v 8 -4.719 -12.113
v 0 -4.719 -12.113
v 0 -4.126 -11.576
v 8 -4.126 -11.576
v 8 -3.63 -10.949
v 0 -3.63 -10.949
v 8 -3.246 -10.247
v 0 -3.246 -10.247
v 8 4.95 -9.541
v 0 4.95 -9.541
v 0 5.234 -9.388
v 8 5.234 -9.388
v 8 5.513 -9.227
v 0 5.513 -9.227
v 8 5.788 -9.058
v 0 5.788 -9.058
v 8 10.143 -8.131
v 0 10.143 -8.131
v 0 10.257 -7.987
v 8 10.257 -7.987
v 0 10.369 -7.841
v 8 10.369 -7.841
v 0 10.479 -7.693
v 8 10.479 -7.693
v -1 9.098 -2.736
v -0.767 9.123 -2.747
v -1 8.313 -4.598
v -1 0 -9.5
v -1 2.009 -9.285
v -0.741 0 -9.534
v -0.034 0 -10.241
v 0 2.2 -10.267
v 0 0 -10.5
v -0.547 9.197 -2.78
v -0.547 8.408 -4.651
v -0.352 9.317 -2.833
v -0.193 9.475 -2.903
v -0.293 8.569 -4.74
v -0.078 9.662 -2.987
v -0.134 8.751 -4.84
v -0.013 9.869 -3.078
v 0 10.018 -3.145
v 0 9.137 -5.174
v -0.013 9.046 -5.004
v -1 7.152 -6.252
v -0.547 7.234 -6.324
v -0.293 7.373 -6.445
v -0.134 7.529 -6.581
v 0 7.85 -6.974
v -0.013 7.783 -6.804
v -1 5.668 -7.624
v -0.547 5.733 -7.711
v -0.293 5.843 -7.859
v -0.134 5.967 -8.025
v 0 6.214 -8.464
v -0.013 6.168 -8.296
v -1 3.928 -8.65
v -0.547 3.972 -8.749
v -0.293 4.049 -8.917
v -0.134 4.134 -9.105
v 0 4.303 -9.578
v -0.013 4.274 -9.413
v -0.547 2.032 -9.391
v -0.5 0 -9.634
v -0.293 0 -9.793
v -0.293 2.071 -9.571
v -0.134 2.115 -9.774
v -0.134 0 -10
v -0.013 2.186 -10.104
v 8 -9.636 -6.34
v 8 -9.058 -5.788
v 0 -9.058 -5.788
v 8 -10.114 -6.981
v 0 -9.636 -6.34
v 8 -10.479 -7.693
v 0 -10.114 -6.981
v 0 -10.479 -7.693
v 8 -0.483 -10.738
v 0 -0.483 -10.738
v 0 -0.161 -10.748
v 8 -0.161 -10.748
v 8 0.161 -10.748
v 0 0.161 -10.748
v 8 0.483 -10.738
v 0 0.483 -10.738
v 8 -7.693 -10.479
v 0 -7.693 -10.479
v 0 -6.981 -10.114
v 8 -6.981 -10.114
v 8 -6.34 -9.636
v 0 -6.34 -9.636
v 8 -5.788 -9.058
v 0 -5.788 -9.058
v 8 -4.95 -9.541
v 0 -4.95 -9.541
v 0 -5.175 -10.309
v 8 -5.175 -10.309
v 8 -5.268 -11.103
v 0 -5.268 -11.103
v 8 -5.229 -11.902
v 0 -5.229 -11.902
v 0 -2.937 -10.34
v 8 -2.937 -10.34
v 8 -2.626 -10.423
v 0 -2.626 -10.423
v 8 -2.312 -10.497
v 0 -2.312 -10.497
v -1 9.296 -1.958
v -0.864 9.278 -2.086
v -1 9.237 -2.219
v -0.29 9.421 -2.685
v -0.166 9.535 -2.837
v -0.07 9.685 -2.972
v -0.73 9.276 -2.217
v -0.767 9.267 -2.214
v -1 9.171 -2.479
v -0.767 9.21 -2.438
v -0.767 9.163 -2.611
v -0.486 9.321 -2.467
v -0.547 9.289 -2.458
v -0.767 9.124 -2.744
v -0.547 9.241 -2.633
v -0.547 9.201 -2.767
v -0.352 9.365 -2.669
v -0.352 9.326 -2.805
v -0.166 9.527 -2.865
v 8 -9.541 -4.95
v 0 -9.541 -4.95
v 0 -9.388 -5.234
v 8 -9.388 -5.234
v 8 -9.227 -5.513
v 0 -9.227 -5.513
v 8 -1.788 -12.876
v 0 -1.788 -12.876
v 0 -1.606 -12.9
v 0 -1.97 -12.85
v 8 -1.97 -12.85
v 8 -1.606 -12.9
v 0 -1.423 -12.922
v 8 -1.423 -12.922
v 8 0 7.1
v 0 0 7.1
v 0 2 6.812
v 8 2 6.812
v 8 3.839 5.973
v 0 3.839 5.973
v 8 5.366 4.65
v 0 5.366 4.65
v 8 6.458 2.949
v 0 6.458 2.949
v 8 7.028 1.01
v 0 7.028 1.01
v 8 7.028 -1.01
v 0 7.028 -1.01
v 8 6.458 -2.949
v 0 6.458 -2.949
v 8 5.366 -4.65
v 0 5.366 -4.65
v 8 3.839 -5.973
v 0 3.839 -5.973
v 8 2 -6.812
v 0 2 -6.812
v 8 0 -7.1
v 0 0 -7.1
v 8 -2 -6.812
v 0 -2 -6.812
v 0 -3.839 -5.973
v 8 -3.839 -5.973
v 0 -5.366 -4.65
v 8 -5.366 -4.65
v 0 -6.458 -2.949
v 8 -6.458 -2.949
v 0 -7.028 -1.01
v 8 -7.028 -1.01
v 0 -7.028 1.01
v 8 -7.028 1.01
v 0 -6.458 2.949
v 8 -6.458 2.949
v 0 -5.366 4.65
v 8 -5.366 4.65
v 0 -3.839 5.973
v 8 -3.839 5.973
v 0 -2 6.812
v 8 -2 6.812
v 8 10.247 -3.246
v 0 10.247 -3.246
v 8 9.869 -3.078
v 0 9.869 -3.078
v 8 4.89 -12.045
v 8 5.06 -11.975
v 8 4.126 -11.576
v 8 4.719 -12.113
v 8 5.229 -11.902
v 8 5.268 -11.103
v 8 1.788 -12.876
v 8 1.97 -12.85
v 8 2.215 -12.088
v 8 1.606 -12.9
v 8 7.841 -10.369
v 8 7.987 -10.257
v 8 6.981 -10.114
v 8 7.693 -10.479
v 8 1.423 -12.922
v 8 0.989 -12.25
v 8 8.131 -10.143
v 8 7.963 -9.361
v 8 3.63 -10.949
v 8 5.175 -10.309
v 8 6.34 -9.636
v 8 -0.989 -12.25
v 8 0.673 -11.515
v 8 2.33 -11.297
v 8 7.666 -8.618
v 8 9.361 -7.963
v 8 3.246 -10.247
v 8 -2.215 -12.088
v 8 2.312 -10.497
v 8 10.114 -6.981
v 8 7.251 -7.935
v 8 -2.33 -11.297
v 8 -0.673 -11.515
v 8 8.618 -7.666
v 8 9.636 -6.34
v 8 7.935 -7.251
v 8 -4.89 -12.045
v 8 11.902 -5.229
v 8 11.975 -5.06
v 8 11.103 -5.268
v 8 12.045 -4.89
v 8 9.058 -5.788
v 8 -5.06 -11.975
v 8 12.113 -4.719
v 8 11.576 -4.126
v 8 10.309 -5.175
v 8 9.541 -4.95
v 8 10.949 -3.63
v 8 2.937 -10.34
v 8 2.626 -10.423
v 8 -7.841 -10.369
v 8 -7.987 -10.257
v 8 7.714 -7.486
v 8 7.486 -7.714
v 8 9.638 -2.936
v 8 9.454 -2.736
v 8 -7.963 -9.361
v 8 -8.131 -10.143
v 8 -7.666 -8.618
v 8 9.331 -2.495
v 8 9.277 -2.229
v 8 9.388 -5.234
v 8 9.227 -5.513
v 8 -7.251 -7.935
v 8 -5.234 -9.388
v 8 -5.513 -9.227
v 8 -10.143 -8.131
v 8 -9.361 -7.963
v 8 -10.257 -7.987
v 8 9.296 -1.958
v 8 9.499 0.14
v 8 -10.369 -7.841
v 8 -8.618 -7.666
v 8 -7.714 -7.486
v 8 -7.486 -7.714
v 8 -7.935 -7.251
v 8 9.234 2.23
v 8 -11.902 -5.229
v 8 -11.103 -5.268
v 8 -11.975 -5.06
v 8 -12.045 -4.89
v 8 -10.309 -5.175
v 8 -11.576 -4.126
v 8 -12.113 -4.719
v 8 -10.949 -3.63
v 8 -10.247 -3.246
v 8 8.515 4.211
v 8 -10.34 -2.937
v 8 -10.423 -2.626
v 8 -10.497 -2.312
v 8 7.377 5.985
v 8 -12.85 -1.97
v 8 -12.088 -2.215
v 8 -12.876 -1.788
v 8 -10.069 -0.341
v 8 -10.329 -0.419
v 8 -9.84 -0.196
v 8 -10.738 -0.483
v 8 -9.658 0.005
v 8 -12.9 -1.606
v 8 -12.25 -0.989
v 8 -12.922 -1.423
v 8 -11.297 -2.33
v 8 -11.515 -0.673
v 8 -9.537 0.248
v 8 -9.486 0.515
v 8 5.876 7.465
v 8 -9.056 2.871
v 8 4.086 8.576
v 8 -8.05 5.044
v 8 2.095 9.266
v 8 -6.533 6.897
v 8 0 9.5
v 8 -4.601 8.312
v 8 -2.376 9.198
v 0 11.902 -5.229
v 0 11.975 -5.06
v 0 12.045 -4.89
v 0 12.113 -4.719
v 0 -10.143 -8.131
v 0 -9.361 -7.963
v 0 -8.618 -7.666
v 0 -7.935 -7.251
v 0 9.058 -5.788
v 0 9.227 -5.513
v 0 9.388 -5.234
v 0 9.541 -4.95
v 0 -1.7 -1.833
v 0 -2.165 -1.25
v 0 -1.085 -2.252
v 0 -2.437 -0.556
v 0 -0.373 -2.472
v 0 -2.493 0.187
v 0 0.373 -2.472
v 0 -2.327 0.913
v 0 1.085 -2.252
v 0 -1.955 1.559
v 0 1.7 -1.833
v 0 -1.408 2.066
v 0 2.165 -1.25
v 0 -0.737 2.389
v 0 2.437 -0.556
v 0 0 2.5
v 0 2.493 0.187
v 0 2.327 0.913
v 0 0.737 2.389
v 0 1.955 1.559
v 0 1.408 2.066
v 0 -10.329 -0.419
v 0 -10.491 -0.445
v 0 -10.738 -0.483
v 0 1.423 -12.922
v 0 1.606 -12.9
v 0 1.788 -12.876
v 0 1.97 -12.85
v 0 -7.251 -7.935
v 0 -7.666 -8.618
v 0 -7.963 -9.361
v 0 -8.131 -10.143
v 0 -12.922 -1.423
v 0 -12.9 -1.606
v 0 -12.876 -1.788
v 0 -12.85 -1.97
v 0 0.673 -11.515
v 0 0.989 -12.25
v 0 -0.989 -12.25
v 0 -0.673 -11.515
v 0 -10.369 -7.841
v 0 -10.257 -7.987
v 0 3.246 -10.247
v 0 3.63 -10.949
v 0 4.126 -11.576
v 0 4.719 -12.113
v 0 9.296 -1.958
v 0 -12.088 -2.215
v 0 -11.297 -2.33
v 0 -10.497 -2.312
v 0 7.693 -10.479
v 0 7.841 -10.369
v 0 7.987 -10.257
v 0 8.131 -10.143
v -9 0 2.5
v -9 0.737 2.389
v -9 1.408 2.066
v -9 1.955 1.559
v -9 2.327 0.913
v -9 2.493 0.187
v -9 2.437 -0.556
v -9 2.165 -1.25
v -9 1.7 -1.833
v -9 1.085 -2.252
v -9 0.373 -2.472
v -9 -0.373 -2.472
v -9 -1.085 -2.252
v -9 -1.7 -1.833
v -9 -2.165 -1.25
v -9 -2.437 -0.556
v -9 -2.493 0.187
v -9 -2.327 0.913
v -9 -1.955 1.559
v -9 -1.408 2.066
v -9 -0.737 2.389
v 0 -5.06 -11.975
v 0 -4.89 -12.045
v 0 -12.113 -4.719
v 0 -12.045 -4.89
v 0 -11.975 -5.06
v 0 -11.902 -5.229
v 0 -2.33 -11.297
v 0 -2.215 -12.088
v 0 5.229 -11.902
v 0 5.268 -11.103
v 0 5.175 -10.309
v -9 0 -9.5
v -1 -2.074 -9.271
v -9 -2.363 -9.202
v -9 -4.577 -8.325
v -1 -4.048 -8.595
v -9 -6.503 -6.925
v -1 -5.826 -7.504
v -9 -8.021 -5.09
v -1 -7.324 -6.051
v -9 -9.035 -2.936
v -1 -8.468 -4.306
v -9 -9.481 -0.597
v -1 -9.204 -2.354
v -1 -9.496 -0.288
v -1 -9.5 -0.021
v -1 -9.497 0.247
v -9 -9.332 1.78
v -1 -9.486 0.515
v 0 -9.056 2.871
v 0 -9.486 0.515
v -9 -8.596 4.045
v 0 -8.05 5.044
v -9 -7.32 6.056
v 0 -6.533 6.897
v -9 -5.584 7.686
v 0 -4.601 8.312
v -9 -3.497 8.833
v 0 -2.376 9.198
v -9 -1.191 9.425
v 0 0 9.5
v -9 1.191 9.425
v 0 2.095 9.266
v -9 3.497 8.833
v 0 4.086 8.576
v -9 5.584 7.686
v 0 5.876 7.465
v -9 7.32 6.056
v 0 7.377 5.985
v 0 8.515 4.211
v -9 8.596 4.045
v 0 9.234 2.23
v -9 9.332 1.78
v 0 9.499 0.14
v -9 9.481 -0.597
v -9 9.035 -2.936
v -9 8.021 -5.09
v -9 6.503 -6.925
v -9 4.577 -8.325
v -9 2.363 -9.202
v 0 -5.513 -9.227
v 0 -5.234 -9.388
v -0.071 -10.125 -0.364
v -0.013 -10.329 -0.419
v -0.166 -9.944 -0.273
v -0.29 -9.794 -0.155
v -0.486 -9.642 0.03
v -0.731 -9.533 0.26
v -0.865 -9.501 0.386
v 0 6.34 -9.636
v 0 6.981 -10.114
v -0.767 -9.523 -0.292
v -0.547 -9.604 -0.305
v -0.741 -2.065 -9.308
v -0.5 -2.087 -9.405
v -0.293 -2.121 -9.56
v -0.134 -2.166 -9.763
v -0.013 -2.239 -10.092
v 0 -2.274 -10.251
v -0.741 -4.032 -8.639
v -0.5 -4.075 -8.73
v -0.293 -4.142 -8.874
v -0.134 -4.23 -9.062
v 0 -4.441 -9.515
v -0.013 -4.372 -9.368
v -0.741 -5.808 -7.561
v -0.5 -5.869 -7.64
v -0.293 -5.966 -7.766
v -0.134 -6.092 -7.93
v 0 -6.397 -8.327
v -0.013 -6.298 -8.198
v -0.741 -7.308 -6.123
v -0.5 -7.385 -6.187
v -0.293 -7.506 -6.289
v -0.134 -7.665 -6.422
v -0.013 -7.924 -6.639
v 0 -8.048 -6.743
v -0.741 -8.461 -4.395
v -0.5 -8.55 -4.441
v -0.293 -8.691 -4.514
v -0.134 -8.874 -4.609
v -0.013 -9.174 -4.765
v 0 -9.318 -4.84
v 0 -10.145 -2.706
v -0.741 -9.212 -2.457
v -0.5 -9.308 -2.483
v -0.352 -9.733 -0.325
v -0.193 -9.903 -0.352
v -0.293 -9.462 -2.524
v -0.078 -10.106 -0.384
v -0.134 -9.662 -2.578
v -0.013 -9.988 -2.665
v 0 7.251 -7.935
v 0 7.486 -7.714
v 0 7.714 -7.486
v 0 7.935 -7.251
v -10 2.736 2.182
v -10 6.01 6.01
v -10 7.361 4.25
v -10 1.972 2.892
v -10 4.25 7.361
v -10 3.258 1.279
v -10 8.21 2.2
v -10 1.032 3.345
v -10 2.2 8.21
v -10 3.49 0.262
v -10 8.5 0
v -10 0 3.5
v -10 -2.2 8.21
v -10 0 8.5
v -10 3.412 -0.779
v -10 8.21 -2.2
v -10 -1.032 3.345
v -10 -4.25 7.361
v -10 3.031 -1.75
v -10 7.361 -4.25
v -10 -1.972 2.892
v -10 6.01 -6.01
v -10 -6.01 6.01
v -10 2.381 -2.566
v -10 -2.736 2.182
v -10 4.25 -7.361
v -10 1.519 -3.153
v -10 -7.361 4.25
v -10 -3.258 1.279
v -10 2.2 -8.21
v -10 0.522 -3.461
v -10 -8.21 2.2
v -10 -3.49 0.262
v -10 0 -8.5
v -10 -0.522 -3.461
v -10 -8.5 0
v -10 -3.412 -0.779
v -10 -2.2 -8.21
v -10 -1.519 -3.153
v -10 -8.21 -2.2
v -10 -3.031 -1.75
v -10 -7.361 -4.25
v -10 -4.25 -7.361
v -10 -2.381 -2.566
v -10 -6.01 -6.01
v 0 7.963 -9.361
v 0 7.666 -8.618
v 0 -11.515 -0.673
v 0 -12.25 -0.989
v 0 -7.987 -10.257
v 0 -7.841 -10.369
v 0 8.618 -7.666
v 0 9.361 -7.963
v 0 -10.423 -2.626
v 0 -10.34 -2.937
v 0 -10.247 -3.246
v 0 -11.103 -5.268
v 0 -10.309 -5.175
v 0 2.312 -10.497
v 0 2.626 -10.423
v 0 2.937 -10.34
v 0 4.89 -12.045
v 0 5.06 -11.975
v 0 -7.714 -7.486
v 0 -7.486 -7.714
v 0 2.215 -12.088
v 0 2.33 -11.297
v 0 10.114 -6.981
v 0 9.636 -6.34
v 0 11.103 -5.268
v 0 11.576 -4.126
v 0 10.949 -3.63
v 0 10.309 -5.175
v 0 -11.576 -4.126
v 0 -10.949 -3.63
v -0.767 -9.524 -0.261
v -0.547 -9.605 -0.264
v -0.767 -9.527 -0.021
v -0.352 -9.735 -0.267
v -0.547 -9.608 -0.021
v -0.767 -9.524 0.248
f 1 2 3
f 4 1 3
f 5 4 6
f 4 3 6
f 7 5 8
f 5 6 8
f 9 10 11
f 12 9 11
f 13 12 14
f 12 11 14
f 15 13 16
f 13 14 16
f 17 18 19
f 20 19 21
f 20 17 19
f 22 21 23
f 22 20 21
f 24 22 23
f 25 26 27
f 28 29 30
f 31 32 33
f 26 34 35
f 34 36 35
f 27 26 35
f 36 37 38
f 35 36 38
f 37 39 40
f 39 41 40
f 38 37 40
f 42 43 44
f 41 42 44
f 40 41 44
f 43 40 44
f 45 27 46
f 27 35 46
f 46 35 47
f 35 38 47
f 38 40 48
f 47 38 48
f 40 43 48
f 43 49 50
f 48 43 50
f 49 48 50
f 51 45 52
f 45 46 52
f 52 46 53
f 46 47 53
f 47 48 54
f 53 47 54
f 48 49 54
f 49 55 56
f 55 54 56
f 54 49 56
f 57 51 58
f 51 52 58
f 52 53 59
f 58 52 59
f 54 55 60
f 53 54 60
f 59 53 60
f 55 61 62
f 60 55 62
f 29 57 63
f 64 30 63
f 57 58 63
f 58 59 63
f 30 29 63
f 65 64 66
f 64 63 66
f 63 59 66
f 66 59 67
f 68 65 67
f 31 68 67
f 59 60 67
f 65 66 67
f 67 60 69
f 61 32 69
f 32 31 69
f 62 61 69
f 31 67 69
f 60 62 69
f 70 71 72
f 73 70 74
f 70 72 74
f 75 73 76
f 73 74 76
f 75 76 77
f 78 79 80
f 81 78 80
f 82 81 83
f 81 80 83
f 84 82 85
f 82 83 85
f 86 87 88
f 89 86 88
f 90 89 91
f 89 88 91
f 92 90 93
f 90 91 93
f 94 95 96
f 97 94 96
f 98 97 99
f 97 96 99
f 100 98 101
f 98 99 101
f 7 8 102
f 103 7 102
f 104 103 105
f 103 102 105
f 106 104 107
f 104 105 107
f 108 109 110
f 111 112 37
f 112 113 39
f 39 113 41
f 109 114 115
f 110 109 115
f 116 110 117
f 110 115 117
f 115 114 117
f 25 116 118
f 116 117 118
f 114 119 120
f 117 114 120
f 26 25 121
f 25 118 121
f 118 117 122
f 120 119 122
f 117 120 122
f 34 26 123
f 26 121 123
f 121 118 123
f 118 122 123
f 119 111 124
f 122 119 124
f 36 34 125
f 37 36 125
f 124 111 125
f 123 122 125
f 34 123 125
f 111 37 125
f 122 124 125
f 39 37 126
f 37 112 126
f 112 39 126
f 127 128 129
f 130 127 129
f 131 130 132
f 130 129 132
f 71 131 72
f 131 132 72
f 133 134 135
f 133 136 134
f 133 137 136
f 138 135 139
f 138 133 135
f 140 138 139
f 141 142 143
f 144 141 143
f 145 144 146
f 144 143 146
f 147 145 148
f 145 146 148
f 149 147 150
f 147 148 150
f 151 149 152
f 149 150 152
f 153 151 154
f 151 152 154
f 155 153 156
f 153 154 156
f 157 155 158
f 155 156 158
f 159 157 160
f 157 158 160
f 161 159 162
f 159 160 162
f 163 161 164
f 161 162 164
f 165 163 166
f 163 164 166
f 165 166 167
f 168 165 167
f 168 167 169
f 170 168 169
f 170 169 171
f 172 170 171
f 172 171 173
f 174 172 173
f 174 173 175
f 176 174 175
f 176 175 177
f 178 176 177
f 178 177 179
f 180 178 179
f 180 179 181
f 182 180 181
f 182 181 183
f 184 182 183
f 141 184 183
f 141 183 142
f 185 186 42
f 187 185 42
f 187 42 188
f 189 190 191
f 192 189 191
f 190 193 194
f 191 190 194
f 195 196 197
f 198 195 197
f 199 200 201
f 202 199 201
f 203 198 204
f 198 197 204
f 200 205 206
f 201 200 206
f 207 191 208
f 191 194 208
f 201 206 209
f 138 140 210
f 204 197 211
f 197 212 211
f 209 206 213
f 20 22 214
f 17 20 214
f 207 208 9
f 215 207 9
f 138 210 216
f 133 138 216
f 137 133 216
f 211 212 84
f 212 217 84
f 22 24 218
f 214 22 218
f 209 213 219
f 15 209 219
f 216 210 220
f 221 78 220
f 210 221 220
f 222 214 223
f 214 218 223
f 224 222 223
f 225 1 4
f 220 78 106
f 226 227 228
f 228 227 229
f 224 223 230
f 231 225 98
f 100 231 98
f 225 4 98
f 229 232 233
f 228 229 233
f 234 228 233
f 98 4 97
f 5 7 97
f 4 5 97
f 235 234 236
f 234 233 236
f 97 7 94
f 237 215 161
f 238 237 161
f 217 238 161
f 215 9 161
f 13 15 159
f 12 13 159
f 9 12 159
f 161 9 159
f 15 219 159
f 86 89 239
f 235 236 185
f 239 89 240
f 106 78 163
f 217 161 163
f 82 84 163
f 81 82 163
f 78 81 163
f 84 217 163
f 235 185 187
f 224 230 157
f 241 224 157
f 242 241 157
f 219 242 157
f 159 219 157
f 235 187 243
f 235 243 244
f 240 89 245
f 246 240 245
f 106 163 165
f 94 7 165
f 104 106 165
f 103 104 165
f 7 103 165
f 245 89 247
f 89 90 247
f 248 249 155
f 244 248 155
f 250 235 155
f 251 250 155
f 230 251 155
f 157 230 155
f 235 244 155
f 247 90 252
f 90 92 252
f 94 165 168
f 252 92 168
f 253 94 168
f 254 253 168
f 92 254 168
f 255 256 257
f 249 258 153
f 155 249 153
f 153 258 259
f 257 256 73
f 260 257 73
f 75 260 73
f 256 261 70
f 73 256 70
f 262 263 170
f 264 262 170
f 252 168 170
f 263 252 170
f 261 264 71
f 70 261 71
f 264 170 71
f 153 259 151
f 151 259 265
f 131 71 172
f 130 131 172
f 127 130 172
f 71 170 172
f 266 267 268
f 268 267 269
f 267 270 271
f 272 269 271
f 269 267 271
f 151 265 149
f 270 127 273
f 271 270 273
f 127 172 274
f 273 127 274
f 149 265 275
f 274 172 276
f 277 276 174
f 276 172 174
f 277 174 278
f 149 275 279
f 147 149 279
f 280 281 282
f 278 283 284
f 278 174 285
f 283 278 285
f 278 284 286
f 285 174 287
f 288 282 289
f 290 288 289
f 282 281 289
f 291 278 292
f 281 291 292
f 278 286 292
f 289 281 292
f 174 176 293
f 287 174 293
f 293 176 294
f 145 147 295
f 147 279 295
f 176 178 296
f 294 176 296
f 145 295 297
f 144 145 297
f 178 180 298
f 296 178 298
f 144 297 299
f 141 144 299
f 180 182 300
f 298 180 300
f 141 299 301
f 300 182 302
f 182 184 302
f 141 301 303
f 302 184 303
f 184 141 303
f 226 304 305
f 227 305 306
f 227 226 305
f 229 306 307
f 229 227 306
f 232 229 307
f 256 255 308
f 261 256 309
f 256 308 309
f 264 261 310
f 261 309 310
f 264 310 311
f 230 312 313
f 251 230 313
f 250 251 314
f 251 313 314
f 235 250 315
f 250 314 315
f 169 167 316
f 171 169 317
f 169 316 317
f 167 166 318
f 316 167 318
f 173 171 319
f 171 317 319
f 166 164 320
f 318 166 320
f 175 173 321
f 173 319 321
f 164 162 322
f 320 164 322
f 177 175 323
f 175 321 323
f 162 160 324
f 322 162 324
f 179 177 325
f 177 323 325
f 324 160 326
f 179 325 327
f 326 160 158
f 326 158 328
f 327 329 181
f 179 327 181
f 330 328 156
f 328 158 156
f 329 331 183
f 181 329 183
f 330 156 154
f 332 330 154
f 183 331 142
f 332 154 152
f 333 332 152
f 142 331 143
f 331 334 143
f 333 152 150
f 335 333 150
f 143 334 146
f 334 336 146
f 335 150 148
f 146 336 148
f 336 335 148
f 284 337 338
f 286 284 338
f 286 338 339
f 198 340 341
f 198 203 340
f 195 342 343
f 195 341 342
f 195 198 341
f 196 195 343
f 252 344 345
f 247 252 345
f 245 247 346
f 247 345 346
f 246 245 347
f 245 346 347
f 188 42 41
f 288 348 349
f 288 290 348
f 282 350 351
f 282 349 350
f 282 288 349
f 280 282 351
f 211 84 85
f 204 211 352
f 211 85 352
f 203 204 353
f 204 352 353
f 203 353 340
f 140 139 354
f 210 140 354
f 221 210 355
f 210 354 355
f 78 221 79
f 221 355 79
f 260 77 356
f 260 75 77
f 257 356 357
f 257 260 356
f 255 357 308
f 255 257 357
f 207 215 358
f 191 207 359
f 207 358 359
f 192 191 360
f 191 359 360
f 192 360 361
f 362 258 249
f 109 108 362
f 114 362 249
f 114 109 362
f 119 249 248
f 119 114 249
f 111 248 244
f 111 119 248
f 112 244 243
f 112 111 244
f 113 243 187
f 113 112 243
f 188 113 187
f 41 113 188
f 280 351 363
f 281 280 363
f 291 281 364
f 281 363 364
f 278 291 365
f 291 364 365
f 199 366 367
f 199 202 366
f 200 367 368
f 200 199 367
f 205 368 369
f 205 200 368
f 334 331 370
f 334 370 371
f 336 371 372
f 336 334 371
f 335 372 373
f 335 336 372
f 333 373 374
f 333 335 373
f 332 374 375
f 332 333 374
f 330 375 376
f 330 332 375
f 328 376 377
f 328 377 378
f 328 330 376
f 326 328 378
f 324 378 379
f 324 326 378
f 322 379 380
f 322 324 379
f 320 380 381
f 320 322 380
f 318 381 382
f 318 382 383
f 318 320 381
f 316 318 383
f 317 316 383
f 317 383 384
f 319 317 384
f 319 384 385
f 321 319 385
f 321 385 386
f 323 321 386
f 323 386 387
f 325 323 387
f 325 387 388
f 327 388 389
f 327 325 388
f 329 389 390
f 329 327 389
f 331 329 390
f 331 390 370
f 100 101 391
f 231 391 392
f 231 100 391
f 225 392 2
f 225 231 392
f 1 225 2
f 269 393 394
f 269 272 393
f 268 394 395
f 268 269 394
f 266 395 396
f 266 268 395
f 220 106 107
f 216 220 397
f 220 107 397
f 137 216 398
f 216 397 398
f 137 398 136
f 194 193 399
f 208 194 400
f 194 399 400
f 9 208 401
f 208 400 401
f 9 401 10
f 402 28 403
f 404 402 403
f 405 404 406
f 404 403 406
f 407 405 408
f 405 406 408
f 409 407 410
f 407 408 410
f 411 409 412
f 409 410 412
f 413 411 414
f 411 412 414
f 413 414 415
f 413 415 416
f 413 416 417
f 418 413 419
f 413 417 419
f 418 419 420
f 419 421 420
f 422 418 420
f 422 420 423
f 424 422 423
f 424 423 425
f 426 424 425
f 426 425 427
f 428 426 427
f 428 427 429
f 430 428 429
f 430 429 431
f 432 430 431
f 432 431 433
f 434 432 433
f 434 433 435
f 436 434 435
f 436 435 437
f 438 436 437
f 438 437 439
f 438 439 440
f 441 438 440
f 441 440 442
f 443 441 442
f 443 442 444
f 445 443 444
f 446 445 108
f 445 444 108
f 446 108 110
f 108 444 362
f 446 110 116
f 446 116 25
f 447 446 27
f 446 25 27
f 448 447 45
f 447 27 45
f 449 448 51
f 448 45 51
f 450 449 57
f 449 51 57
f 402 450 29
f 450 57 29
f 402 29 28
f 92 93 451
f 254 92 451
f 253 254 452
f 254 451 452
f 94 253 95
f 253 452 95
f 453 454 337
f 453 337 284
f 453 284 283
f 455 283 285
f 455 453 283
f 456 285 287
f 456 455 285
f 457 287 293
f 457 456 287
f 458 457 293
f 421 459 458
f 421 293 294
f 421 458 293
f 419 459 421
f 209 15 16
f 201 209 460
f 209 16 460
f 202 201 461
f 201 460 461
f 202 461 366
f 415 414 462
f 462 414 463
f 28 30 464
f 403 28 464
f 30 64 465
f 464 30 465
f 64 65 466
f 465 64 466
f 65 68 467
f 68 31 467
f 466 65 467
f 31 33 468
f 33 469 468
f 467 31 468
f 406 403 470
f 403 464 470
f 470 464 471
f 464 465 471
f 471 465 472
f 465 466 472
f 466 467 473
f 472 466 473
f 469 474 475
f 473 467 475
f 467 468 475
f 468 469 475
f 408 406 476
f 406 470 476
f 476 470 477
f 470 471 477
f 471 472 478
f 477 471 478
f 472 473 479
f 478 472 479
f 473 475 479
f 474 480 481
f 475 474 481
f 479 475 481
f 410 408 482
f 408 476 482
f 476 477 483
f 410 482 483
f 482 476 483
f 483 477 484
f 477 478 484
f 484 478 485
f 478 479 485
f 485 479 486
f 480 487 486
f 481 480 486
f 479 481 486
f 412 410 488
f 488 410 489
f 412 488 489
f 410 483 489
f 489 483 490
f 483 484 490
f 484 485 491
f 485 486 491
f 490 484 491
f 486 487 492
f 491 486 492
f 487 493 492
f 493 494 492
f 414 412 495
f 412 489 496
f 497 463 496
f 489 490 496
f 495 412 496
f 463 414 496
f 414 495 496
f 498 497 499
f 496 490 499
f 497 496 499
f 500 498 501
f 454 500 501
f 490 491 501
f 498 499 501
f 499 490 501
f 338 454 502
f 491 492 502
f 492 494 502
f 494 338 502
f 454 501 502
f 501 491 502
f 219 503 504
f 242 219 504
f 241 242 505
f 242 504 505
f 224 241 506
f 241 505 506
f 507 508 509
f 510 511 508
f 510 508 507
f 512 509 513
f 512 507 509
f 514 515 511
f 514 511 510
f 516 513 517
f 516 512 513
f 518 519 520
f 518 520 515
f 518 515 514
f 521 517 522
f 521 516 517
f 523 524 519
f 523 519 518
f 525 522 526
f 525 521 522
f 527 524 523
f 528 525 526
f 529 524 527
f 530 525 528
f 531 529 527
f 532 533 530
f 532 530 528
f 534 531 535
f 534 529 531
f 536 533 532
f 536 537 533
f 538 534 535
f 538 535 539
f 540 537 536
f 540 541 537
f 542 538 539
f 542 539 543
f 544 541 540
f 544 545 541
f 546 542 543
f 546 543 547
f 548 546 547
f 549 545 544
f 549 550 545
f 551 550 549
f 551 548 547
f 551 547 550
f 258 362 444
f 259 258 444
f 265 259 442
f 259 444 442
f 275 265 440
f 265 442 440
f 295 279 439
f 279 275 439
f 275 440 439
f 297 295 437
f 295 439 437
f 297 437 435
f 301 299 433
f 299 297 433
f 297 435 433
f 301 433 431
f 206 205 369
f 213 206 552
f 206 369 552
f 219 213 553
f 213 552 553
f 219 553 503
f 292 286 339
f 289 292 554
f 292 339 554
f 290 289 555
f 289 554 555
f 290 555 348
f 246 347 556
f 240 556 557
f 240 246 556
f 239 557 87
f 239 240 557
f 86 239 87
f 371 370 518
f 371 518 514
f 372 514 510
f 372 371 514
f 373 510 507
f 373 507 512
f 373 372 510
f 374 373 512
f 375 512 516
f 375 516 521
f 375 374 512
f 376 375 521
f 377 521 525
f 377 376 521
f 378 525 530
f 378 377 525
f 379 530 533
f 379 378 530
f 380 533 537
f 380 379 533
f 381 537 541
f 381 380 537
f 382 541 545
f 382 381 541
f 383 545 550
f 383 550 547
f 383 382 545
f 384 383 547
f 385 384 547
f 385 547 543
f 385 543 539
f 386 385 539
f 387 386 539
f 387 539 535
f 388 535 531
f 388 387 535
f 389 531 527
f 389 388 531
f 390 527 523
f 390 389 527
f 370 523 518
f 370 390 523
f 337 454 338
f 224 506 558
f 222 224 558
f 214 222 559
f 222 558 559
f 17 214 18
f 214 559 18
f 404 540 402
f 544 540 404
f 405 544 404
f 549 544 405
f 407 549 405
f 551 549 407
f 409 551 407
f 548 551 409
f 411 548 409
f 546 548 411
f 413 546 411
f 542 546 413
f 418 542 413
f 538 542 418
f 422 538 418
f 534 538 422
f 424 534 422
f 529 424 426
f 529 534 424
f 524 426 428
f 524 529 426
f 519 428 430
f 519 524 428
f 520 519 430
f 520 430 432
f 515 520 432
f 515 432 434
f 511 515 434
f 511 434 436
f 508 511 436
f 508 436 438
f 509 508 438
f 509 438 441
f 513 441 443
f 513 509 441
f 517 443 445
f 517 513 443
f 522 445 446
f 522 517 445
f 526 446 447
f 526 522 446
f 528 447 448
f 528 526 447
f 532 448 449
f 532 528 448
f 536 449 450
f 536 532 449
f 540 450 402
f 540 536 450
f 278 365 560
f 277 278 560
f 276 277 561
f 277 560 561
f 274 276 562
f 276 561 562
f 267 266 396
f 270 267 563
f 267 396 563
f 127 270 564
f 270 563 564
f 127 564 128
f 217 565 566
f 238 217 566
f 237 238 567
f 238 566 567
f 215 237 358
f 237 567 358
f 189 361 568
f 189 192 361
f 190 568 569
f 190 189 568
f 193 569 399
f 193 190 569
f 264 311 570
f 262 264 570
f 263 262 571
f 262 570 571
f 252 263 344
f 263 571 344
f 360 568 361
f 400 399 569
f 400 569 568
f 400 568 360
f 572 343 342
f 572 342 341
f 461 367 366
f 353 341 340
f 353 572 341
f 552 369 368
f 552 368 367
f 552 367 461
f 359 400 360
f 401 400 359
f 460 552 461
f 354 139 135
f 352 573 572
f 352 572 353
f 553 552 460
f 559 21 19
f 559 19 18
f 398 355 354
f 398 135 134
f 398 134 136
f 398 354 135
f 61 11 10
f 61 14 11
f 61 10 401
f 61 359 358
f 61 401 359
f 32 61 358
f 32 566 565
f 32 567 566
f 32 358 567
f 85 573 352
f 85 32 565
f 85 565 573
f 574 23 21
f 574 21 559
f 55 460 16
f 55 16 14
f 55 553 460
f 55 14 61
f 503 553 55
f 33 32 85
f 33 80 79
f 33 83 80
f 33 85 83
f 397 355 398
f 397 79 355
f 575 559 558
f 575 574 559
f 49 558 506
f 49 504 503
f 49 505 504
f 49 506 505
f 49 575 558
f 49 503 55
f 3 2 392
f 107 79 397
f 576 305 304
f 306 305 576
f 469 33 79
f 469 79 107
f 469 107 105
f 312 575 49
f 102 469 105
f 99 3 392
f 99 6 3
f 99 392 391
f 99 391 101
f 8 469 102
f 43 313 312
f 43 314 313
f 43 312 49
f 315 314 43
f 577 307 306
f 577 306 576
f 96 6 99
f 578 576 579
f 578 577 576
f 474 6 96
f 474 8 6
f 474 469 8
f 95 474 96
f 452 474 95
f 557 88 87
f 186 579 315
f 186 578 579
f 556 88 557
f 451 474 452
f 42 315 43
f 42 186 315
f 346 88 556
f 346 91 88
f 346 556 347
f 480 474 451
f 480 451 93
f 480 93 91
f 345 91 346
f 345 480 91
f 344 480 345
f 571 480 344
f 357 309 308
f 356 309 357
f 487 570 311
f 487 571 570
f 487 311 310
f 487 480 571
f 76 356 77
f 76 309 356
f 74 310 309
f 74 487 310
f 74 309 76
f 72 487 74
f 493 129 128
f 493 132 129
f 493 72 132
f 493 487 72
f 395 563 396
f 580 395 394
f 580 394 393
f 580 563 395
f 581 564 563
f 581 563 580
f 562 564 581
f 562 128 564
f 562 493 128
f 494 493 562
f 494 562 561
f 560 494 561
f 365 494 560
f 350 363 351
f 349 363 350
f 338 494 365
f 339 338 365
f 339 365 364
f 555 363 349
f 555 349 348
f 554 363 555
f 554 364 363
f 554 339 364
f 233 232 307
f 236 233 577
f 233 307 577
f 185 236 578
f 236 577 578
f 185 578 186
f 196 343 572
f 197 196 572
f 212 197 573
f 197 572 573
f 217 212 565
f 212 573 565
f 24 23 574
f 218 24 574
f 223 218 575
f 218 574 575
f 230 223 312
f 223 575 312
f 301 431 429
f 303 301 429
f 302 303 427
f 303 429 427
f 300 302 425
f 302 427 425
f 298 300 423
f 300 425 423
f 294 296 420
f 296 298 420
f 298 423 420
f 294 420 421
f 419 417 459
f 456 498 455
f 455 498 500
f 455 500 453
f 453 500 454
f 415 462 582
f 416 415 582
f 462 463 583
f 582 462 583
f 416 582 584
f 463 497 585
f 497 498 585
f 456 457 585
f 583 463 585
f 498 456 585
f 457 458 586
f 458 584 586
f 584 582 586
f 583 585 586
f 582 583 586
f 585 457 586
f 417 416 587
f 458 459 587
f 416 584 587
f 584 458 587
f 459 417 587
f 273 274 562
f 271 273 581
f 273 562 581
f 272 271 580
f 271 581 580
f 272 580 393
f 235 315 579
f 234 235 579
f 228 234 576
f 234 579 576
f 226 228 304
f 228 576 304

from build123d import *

# Parameters (mm, degrees)
BASPROSKE_W         = 8
BASPROSKE_H         = 13
TOOTHCUT_DEPTH      = 21.049937656
TEETHCUTS_COUNT     = 24
TEETHCUTS_ANGLE     = 345
BORSKE_R            = 2.5
BORE_DEPTH          = 50.0000508
SKETCH2_R           = 9.5
SKETCH2_R_2         = 7.1
SKETCH2_R_3         = 2.5
BOSS_EXTRUDE1_DEPTH = 10
CUT_EXTRUDE1_DEPTH  = 10
SKETCH2_4_R         = 7.1
SKETCH2_4_R_2       = 2.5
CUT_EXTRUDE2_DEPTH  = 21.83151436
FILLET1_R           = 1
CHAMFER1_SIZE       = 1


with BuildPart() as part:
    # BasProSke → Base-Revolve (revolve)
    with BuildSketch(Plane(origin=(0, 0, 0), x_dir=(1, 0, 0), z_dir=(0, 1, 0)), mode=Mode.PRIVATE) as base_revolve_sk:
        with Locations((4, 6.5)):
            Rectangle(BASPROSKE_W, BASPROSKE_H)
    revolve(base_revolve_sk.sketch.rotate(Axis((-10, 0, 0), (1, 0, 0)), 180), axis=Axis((-10, 0, 0), (1, 0, 0)))

    # TooCutSke → ToothCut (cut, through all)
    with BuildSketch(Plane(origin=(0, 0, 0), x_dir=(0, 0, -1), z_dir=(1, 0, 0))):
        with BuildLine():
            ThreePointArc((0.483448384, 10.738122679), (0, 10.749), (-0.483448384, 10.738122679))
            ThreePointArc((-0.483448384, 10.738122679), (-0.821636462, 11.902754369), (-1.44092227, 12.945454344))
            ThreePointArc((-1.44092227, 12.945454344), (0, 13.0254), (1.44092227, 12.945454344))
            ThreePointArc((1.44092227, 12.945454344), (0.821636462, 11.902754369), (0.483448384, 10.738122679))
        make_face()
    toothcut = extrude(amount=TOOTHCUT_DEPTH, mode=Mode.SUBTRACT)

    # TeethCuts: ToothCut ×24 about axis
    teethcuts_axis = Axis((-10, 0, 0), (1, 0, 0))
    for i in range(1, TEETHCUTS_COUNT):
        add(toothcut.rotate(teethcuts_axis, i * TEETHCUTS_ANGLE / (TEETHCUTS_COUNT - 1)), mode=Mode.SUBTRACT)

    # BorSke → Bore (cut, symmetric)
    with BuildSketch(Plane(origin=(0, 0, 0), x_dir=(0, 0, -1), z_dir=(1, 0, 0))):
        with Locations(Location((0, 0, 0), (0, 0, 180))):
            Circle(BORSKE_R)
    extrude(amount=BORE_DEPTH, both=True, mode=Mode.SUBTRACT)

    # Sketch2 → Boss-Extrude1 (add)
    # profile 1 of 2: a face of its own
    with BuildSketch(Plane.ZY):
        with Locations(Location((0, 0, 0), (0, 0, 180))):
            Circle(SKETCH2_R)
        Circle(SKETCH2_R_2, mode=Mode.SUBTRACT)
    # profile 2 of 2: a face of its own
    with BuildSketch(Plane.ZY):
        Circle(SKETCH2_R_2)
        Circle(SKETCH2_R_3, mode=Mode.SUBTRACT)
    extrude(amount=BOSS_EXTRUDE1_DEPTH)

    # Sketch2<3> → Cut-Extrude1 (cut)
    with BuildSketch(Plane.ZY):
        with BuildLine():
            ThreePointArc((-2.312255378, 10.49735567), (-2.782045916, 10.382736707), (-3.246205938, 10.247104372))
            Line((-3.246205938, 10.247104372), (-2.735935918, 9.097508156))
            ThreePointArc((-2.735935918, 9.097508156), (5.668271729, 7.623693043), (9.5, 0))
            ThreePointArc((9.5, 0), (6.614870502, -6.818613367), (-0.288102788, -9.495630405))
            Line((-0.288102788, -9.495630405), (-0.483448384, -10.738122679))
            ThreePointArc((-0.483448384, -10.738122679), (0, -10.749), (0.483448384, -10.738122679))
            ThreePointArc((0.483448384, -10.738122679), (0.815732219, -11.889084866), (1.422675204, -12.921919179))
            ThreePointArc((1.422675204, -12.921919179), (1.696840499, -12.888783198), (1.970240061, -12.849830898))
            ThreePointArc((1.970240061, -12.849830898), (2.289184775, -11.695101157), (2.312255378, -10.49735567))
            ThreePointArc((2.312255378, -10.49735567), (2.782045916, -10.382736707), (3.246205938, -10.247104372))
            ThreePointArc((3.246205938, -10.247104372), (3.86505841, -11.272847089), (4.718637505, -12.113400022))
            ThreePointArc((4.718637505, -12.113400022), (4.974884621, -12.010433923), (5.228886722, -11.902047876))
            ThreePointArc((5.228886722, -11.902047876), (5.238097609, -10.704115631), (4.950382757, -9.541211221))
            ThreePointArc((4.950382757, -9.541211221), (5.3745, -9.308907065), (5.787739922, -9.057762836))
            ThreePointArc((5.787739922, -9.057762836), (6.650987257, -9.888383413), (7.693032457, -10.479372673))
            ThreePointArc((7.693032457, -10.479372673), (7.913898577, -10.313593424), (8.131193393, -10.143159961))
            ThreePointArc((8.131193393, -10.143159961), (7.830042747, -8.983662315), (7.251149732, -7.934848994))
            ThreePointArc((7.251149732, -7.934848994), (7.600690791, -7.600690791), (7.934848994, -7.251149732))
            ThreePointArc((7.934848994, -7.251149732), (8.983662315, -7.830042747), (10.143159961, -8.131193393))
            ThreePointArc((10.143159961, -8.131193393), (10.313593424, -7.913898577), (10.479372673, -7.693032457))
            ThreePointArc((10.479372673, -7.693032457), (9.888383413, -6.650987257), (9.057762836, -5.787739922))
            ThreePointArc((9.057762836, -5.787739922), (9.308907065, -5.3745), (9.541211221, -4.950382757))
            ThreePointArc((9.541211221, -4.950382757), (10.704115631, -5.238097609), (11.902047876, -5.228886722))
            ThreePointArc((11.902047876, -5.228886722), (12.010433923, -4.974884621), (12.113400022, -4.718637505))
            ThreePointArc((12.113400022, -4.718637505), (11.272847089, -3.86505841), (10.247104372, -3.246205938))
            ThreePointArc((10.247104372, -3.246205938), (10.382736707, -2.782045916), (10.49735567, -2.312255378))
            ThreePointArc((10.49735567, -2.312255378), (11.695101157, -2.289184775), (12.849830898, -1.970240061))
            ThreePointArc((12.849830898, -1.970240061), (12.888783198, -1.696840499), (12.921919179, -1.422675204))
            ThreePointArc((12.921919179, -1.422675204), (11.889084866, -0.815732219), (10.738122679, -0.483448384))
            ThreePointArc((10.738122679, -0.483448384), (10.749, 0), (10.738122679, 0.483448384))
            ThreePointArc((10.738122679, 0.483448384), (11.889084866, 0.815732219), (12.921919179, 1.422675204))
            ThreePointArc((12.921919179, 1.422675204), (12.888783198, 1.696840499), (12.849830898, 1.970240061))
            ThreePointArc((12.849830898, 1.970240061), (11.695101157, 2.289184775), (10.49735567, 2.312255378))
            ThreePointArc((10.49735567, 2.312255378), (10.382736707, 2.782045916), (10.247104372, 3.246205938))
            ThreePointArc((10.247104372, 3.246205938), (11.272847089, 3.86505841), (12.113400022, 4.718637505))
            ThreePointArc((12.113400022, 4.718637505), (12.010433923, 4.974884621), (11.902047876, 5.228886722))
            ThreePointArc((11.902047876, 5.228886722), (10.704115631, 5.238097609), (9.541211221, 4.950382757))
            ThreePointArc((9.541211221, 4.950382757), (9.308907065, 5.3745), (9.057762836, 5.787739922))
            ThreePointArc((9.057762836, 5.787739922), (9.888383413, 6.650987257), (10.479372673, 7.693032457))
            ThreePointArc((10.479372673, 7.693032457), (10.313593424, 7.913898577), (10.143159961, 8.131193393))
            ThreePointArc((10.143159961, 8.131193393), (8.983662315, 7.830042747), (7.934848994, 7.251149732))
            ThreePointArc((7.934848994, 7.251149732), (7.600690791, 7.600690791), (7.251149732, 7.934848994))
            ThreePointArc((7.251149732, 7.934848994), (7.830042747, 8.983662315), (8.131193393, 10.143159961))
            ThreePointArc((8.131193393, 10.143159961), (7.913898577, 10.313593424), (7.693032457, 10.479372673))
            ThreePointArc((7.693032457, 10.479372673), (6.650987257, 9.888383413), (5.787739922, 9.057762836))
            ThreePointArc((5.787739922, 9.057762836), (5.3745, 9.308907065), (4.950382757, 9.541211221))
            ThreePointArc((4.950382757, 9.541211221), (5.238097609, 10.704115631), (5.228886722, 11.902047876))
            ThreePointArc((5.228886722, 11.902047876), (4.974884621, 12.010433923), (4.718637505, 12.113400022))
            ThreePointArc((4.718637505, 12.113400022), (3.86505841, 11.272847089), (3.246205938, 10.247104372))
            ThreePointArc((3.246205938, 10.247104372), (2.782045916, 10.382736707), (2.312255378, 10.49735567))
            ThreePointArc((2.312255378, 10.49735567), (2.289184775, 11.695101157), (1.970240061, 12.849830898))
            ThreePointArc((1.970240061, 12.849830898), (1.696840499, 12.888783198), (1.422675204, 12.921919179))
            ThreePointArc((1.422675204, 12.921919179), (0.815732219, 11.889084866), (0.483448384, 10.738122679))
            ThreePointArc((0.483448384, 10.738122679), (0, 10.749), (-0.483448384, 10.738122679))
            ThreePointArc((-0.483448384, 10.738122679), (-0.815732219, 11.889084866), (-1.422675204, 12.921919179))
            ThreePointArc((-1.422675204, 12.921919179), (-1.696840499, 12.888783198), (-1.970240061, 12.849830898))
            ThreePointArc((-1.970240061, 12.849830898), (-2.289184775, 11.695101157), (-2.312255378, 10.49735567))
        make_face()
    extrude(amount=-CUT_EXTRUDE1_DEPTH, mode=Mode.SUBTRACT)

    # Sketch2<4> → Cut-Extrude2 (cut, through all)
    with BuildSketch(Plane.ZY):
        Circle(SKETCH2_4_R)
        Circle(SKETCH2_4_R_2, mode=Mode.SUBTRACT)
    extrude(amount=-CUT_EXTRUDE2_DEPTH, mode=Mode.SUBTRACT)

    # Fillet1
    # the kernel refuses this fillet: 1 mm, written as the material it adds along each edge
    with BuildSketch(Plane(origin=(0, 0, 0), x_dir=(0, 0, -1), z_dir=(0, 1, 0))) as fillet1_piece_1_section:
        with BuildLine():
            CenterArc((9.5 + FILLET1_R, FILLET1_R), FILLET1_R, 180, 90)
            Line((9.5, FILLET1_R), (9.5, 0))
            Line((9.5, 0), (9.5 + FILLET1_R, 0))
        make_face()
    fillet1_piece_1 = revolve(axis=Axis((0, 0, 0), (-1, 0, 0)), revolution_arc=103.345808715, mode=Mode.PRIVATE)
    fillet1_piece_1 = split(fillet1_piece_1, bisect_by=Plane(origin=(-0.281845865, -7.908879118, -0.038632524), z_dir=(0, 0.15531294924134567, -0.9878653186532844)), keep=Keep.TOP, mode=Mode.PRIVATE)
    add(fillet1_piece_1)
    with BuildSketch(Plane(origin=(0, -9.495630405, -0.288102788), x_dir=(0, -0.9878653186532845, -0.15531294924134548), z_dir=(1, 0, 0))) as fillet1_piece_2:
        with BuildLine():
            CenterArc((0.843884873, -1), FILLET1_R, 90, 77.960305795)
            ThreePointArc((-0.134118453, -0.791410704), (-0.058696795, -0.397122513), (0, 0))
            Line((0, 0), (0.843884873, 0))
        make_face()
    extrude(amount=8)
    with BuildSketch(Plane(origin=(0, 9.097508156, -2.735935918), x_dir=(0, 0.9140066749677942, -0.4056991472930614), z_dir=(1, 0, 0))) as fillet1_piece_3:
        with BuildLine():
            CenterArc((0.843884873, 1), FILLET1_R, 192.039694205, 77.960305795)
            ThreePointArc((-0.134118453, 0.791410704), (-0.058696795, 0.397122513), (0, 0))
            Line((0, 0), (0.843884873, 0))
        make_face()
    extrude(amount=8)
    with BuildSketch(Plane(origin=(0, 0, 0), x_dir=(0, 0.9995823457354229, -0.028898686718770317), z_dir=(0, 0.028898686718770317, 0.9995823457354229))) as fillet1_piece_4_section:
        with BuildLine():
            CenterArc((9.5 + FILLET1_R, FILLET1_R), FILLET1_R, 180, 90)
            Line((9.5, FILLET1_R), (9.5, 0))
            Line((9.5, 0), (9.5 + FILLET1_R, 0))
        make_face()
    fillet1_piece_4 = revolve(axis=Axis((0, 0, 0), (-1, 0, 0)), revolution_arc=88.343996666, mode=Mode.PRIVATE)
    fillet1_piece_4 = split(fillet1_piece_4, bisect_by=Plane(origin=(-0.282512294, 8.270021566, -2.368640346), z_dir=(0, -0.4056991472930615, -0.9140066749677941)), keep=Keep.TOP, mode=Mode.PRIVATE)
    add(fillet1_piece_4)
    with BuildSketch(Plane(origin=(0, 0, 0), x_dir=(0, 0, -1), z_dir=(0, 1, 0))) as fillet1_piece_5a_section:
        with BuildLine():
            CenterArc((9.5 + FILLET1_R, FILLET1_R), FILLET1_R, 180, 90)
            Line((9.5, FILLET1_R), (9.5, 0))
            Line((9.5, 0), (9.5 + FILLET1_R, 0))
        make_face()
    fillet1_piece_5a = revolve(axis=Axis((0, 0, 0), (-1, 0, 0)), revolution_arc=103.345808715, mode=Mode.PRIVATE)
    fillet1_piece_5a = split(fillet1_piece_5a, bisect_by=Plane(origin=(-0.222264808, -9.459956662, -0.282494135), z_dir=(0, -0.15531294924134567, 0.9878653186532844)), keep=Keep.TOP, mode=Mode.PRIVATE)
    with BuildSketch(Plane(origin=(-2.109712182, -9.495630405, -0.288102788), x_dir=(0, -0.9878653186532844, -0.15531294924134598), z_dir=(1, 0, 0))) as fillet1_piece_5b_section:
        with BuildLine():
            CenterArc((0.843884873, -1), FILLET1_R, 90, 77.960305795)
            ThreePointArc((-0.134118453, -0.791410704), (-0.058696795, -0.397122513), (0, 0))
            Line((0, 0), (0.843884873, 0))
        make_face()
    fillet1_piece_5b = extrude(amount=10.109712182, mode=Mode.PRIVATE)
    fillet1_piece_5b = split(fillet1_piece_5b, bisect_by=Plane(origin=(0, -9.685689477, -0.139811966), z_dir=(-1, 0, 0)), keep=Keep.TOP, mode=Mode.PRIVATE)
    fillet1_piece_5 = fillet1_piece_5a & fillet1_piece_5b
    add(fillet1_piece_5)
    with BuildSketch(Plane(origin=(0, 0, 0), x_dir=(0, 0.9995823457354229, -0.028898686718770317), z_dir=(0, 0.028898686718770317, 0.9995823457354229))) as fillet1_piece_6a_section:
        with BuildLine():
            CenterArc((9.5 + FILLET1_R, FILLET1_R), FILLET1_R, 180, 90)
            Line((9.5, FILLET1_R), (9.5, 0))
            Line((9.5, 0), (9.5 + FILLET1_R, 0))
        make_face()
    fillet1_piece_6a = revolve(axis=Axis((0, 0, 0), (-1, 0, 0)), revolution_arc=88.343996666, mode=Mode.PRIVATE)
    fillet1_piece_6a = split(fillet1_piece_6a, bisect_by=Plane(origin=(-0.222264609, 9.064543487, -2.721303926), z_dir=(0, 0.4056991472930615, 0.9140066749677941)), keep=Keep.TOP, mode=Mode.PRIVATE)
    with BuildSketch(Plane(origin=(-2.109712182, 9.097508156, -2.735935918), x_dir=(0, 0.9140066749677942, -0.4056991472930614), z_dir=(1, 0, 0))) as fillet1_piece_6b_section:
        with BuildLine():
            CenterArc((0.843884873, 1), FILLET1_R, 192.039694205, 77.960305795)
            ThreePointArc((-0.134118453, 0.791410704), (-0.058696795, 0.397122513), (0, 0))
            Line((0, 0), (0.843884873, 0))
        make_face()
    fillet1_piece_6b = extrude(amount=10.109712182, mode=Mode.PRIVATE)
    fillet1_piece_6b = split(fillet1_piece_6b, bisect_by=Plane(origin=(0, 9.319471612, -2.641888891), z_dir=(-1, 0, 0)), keep=Keep.TOP, mode=Mode.PRIVATE)
    fillet1_piece_6 = fillet1_piece_6a & fillet1_piece_6b
    add(fillet1_piece_6)

    # Chamfer1
    chamfer1_edges = [part.edges().sort_by_distance(p)[0] for p in [
        (-10, 0, -2.5),
        (-10, 0, 9.5),
    ]]
    chamfer(chamfer1_edges, length=CHAMFER1_SIZE)


solid = part.part
